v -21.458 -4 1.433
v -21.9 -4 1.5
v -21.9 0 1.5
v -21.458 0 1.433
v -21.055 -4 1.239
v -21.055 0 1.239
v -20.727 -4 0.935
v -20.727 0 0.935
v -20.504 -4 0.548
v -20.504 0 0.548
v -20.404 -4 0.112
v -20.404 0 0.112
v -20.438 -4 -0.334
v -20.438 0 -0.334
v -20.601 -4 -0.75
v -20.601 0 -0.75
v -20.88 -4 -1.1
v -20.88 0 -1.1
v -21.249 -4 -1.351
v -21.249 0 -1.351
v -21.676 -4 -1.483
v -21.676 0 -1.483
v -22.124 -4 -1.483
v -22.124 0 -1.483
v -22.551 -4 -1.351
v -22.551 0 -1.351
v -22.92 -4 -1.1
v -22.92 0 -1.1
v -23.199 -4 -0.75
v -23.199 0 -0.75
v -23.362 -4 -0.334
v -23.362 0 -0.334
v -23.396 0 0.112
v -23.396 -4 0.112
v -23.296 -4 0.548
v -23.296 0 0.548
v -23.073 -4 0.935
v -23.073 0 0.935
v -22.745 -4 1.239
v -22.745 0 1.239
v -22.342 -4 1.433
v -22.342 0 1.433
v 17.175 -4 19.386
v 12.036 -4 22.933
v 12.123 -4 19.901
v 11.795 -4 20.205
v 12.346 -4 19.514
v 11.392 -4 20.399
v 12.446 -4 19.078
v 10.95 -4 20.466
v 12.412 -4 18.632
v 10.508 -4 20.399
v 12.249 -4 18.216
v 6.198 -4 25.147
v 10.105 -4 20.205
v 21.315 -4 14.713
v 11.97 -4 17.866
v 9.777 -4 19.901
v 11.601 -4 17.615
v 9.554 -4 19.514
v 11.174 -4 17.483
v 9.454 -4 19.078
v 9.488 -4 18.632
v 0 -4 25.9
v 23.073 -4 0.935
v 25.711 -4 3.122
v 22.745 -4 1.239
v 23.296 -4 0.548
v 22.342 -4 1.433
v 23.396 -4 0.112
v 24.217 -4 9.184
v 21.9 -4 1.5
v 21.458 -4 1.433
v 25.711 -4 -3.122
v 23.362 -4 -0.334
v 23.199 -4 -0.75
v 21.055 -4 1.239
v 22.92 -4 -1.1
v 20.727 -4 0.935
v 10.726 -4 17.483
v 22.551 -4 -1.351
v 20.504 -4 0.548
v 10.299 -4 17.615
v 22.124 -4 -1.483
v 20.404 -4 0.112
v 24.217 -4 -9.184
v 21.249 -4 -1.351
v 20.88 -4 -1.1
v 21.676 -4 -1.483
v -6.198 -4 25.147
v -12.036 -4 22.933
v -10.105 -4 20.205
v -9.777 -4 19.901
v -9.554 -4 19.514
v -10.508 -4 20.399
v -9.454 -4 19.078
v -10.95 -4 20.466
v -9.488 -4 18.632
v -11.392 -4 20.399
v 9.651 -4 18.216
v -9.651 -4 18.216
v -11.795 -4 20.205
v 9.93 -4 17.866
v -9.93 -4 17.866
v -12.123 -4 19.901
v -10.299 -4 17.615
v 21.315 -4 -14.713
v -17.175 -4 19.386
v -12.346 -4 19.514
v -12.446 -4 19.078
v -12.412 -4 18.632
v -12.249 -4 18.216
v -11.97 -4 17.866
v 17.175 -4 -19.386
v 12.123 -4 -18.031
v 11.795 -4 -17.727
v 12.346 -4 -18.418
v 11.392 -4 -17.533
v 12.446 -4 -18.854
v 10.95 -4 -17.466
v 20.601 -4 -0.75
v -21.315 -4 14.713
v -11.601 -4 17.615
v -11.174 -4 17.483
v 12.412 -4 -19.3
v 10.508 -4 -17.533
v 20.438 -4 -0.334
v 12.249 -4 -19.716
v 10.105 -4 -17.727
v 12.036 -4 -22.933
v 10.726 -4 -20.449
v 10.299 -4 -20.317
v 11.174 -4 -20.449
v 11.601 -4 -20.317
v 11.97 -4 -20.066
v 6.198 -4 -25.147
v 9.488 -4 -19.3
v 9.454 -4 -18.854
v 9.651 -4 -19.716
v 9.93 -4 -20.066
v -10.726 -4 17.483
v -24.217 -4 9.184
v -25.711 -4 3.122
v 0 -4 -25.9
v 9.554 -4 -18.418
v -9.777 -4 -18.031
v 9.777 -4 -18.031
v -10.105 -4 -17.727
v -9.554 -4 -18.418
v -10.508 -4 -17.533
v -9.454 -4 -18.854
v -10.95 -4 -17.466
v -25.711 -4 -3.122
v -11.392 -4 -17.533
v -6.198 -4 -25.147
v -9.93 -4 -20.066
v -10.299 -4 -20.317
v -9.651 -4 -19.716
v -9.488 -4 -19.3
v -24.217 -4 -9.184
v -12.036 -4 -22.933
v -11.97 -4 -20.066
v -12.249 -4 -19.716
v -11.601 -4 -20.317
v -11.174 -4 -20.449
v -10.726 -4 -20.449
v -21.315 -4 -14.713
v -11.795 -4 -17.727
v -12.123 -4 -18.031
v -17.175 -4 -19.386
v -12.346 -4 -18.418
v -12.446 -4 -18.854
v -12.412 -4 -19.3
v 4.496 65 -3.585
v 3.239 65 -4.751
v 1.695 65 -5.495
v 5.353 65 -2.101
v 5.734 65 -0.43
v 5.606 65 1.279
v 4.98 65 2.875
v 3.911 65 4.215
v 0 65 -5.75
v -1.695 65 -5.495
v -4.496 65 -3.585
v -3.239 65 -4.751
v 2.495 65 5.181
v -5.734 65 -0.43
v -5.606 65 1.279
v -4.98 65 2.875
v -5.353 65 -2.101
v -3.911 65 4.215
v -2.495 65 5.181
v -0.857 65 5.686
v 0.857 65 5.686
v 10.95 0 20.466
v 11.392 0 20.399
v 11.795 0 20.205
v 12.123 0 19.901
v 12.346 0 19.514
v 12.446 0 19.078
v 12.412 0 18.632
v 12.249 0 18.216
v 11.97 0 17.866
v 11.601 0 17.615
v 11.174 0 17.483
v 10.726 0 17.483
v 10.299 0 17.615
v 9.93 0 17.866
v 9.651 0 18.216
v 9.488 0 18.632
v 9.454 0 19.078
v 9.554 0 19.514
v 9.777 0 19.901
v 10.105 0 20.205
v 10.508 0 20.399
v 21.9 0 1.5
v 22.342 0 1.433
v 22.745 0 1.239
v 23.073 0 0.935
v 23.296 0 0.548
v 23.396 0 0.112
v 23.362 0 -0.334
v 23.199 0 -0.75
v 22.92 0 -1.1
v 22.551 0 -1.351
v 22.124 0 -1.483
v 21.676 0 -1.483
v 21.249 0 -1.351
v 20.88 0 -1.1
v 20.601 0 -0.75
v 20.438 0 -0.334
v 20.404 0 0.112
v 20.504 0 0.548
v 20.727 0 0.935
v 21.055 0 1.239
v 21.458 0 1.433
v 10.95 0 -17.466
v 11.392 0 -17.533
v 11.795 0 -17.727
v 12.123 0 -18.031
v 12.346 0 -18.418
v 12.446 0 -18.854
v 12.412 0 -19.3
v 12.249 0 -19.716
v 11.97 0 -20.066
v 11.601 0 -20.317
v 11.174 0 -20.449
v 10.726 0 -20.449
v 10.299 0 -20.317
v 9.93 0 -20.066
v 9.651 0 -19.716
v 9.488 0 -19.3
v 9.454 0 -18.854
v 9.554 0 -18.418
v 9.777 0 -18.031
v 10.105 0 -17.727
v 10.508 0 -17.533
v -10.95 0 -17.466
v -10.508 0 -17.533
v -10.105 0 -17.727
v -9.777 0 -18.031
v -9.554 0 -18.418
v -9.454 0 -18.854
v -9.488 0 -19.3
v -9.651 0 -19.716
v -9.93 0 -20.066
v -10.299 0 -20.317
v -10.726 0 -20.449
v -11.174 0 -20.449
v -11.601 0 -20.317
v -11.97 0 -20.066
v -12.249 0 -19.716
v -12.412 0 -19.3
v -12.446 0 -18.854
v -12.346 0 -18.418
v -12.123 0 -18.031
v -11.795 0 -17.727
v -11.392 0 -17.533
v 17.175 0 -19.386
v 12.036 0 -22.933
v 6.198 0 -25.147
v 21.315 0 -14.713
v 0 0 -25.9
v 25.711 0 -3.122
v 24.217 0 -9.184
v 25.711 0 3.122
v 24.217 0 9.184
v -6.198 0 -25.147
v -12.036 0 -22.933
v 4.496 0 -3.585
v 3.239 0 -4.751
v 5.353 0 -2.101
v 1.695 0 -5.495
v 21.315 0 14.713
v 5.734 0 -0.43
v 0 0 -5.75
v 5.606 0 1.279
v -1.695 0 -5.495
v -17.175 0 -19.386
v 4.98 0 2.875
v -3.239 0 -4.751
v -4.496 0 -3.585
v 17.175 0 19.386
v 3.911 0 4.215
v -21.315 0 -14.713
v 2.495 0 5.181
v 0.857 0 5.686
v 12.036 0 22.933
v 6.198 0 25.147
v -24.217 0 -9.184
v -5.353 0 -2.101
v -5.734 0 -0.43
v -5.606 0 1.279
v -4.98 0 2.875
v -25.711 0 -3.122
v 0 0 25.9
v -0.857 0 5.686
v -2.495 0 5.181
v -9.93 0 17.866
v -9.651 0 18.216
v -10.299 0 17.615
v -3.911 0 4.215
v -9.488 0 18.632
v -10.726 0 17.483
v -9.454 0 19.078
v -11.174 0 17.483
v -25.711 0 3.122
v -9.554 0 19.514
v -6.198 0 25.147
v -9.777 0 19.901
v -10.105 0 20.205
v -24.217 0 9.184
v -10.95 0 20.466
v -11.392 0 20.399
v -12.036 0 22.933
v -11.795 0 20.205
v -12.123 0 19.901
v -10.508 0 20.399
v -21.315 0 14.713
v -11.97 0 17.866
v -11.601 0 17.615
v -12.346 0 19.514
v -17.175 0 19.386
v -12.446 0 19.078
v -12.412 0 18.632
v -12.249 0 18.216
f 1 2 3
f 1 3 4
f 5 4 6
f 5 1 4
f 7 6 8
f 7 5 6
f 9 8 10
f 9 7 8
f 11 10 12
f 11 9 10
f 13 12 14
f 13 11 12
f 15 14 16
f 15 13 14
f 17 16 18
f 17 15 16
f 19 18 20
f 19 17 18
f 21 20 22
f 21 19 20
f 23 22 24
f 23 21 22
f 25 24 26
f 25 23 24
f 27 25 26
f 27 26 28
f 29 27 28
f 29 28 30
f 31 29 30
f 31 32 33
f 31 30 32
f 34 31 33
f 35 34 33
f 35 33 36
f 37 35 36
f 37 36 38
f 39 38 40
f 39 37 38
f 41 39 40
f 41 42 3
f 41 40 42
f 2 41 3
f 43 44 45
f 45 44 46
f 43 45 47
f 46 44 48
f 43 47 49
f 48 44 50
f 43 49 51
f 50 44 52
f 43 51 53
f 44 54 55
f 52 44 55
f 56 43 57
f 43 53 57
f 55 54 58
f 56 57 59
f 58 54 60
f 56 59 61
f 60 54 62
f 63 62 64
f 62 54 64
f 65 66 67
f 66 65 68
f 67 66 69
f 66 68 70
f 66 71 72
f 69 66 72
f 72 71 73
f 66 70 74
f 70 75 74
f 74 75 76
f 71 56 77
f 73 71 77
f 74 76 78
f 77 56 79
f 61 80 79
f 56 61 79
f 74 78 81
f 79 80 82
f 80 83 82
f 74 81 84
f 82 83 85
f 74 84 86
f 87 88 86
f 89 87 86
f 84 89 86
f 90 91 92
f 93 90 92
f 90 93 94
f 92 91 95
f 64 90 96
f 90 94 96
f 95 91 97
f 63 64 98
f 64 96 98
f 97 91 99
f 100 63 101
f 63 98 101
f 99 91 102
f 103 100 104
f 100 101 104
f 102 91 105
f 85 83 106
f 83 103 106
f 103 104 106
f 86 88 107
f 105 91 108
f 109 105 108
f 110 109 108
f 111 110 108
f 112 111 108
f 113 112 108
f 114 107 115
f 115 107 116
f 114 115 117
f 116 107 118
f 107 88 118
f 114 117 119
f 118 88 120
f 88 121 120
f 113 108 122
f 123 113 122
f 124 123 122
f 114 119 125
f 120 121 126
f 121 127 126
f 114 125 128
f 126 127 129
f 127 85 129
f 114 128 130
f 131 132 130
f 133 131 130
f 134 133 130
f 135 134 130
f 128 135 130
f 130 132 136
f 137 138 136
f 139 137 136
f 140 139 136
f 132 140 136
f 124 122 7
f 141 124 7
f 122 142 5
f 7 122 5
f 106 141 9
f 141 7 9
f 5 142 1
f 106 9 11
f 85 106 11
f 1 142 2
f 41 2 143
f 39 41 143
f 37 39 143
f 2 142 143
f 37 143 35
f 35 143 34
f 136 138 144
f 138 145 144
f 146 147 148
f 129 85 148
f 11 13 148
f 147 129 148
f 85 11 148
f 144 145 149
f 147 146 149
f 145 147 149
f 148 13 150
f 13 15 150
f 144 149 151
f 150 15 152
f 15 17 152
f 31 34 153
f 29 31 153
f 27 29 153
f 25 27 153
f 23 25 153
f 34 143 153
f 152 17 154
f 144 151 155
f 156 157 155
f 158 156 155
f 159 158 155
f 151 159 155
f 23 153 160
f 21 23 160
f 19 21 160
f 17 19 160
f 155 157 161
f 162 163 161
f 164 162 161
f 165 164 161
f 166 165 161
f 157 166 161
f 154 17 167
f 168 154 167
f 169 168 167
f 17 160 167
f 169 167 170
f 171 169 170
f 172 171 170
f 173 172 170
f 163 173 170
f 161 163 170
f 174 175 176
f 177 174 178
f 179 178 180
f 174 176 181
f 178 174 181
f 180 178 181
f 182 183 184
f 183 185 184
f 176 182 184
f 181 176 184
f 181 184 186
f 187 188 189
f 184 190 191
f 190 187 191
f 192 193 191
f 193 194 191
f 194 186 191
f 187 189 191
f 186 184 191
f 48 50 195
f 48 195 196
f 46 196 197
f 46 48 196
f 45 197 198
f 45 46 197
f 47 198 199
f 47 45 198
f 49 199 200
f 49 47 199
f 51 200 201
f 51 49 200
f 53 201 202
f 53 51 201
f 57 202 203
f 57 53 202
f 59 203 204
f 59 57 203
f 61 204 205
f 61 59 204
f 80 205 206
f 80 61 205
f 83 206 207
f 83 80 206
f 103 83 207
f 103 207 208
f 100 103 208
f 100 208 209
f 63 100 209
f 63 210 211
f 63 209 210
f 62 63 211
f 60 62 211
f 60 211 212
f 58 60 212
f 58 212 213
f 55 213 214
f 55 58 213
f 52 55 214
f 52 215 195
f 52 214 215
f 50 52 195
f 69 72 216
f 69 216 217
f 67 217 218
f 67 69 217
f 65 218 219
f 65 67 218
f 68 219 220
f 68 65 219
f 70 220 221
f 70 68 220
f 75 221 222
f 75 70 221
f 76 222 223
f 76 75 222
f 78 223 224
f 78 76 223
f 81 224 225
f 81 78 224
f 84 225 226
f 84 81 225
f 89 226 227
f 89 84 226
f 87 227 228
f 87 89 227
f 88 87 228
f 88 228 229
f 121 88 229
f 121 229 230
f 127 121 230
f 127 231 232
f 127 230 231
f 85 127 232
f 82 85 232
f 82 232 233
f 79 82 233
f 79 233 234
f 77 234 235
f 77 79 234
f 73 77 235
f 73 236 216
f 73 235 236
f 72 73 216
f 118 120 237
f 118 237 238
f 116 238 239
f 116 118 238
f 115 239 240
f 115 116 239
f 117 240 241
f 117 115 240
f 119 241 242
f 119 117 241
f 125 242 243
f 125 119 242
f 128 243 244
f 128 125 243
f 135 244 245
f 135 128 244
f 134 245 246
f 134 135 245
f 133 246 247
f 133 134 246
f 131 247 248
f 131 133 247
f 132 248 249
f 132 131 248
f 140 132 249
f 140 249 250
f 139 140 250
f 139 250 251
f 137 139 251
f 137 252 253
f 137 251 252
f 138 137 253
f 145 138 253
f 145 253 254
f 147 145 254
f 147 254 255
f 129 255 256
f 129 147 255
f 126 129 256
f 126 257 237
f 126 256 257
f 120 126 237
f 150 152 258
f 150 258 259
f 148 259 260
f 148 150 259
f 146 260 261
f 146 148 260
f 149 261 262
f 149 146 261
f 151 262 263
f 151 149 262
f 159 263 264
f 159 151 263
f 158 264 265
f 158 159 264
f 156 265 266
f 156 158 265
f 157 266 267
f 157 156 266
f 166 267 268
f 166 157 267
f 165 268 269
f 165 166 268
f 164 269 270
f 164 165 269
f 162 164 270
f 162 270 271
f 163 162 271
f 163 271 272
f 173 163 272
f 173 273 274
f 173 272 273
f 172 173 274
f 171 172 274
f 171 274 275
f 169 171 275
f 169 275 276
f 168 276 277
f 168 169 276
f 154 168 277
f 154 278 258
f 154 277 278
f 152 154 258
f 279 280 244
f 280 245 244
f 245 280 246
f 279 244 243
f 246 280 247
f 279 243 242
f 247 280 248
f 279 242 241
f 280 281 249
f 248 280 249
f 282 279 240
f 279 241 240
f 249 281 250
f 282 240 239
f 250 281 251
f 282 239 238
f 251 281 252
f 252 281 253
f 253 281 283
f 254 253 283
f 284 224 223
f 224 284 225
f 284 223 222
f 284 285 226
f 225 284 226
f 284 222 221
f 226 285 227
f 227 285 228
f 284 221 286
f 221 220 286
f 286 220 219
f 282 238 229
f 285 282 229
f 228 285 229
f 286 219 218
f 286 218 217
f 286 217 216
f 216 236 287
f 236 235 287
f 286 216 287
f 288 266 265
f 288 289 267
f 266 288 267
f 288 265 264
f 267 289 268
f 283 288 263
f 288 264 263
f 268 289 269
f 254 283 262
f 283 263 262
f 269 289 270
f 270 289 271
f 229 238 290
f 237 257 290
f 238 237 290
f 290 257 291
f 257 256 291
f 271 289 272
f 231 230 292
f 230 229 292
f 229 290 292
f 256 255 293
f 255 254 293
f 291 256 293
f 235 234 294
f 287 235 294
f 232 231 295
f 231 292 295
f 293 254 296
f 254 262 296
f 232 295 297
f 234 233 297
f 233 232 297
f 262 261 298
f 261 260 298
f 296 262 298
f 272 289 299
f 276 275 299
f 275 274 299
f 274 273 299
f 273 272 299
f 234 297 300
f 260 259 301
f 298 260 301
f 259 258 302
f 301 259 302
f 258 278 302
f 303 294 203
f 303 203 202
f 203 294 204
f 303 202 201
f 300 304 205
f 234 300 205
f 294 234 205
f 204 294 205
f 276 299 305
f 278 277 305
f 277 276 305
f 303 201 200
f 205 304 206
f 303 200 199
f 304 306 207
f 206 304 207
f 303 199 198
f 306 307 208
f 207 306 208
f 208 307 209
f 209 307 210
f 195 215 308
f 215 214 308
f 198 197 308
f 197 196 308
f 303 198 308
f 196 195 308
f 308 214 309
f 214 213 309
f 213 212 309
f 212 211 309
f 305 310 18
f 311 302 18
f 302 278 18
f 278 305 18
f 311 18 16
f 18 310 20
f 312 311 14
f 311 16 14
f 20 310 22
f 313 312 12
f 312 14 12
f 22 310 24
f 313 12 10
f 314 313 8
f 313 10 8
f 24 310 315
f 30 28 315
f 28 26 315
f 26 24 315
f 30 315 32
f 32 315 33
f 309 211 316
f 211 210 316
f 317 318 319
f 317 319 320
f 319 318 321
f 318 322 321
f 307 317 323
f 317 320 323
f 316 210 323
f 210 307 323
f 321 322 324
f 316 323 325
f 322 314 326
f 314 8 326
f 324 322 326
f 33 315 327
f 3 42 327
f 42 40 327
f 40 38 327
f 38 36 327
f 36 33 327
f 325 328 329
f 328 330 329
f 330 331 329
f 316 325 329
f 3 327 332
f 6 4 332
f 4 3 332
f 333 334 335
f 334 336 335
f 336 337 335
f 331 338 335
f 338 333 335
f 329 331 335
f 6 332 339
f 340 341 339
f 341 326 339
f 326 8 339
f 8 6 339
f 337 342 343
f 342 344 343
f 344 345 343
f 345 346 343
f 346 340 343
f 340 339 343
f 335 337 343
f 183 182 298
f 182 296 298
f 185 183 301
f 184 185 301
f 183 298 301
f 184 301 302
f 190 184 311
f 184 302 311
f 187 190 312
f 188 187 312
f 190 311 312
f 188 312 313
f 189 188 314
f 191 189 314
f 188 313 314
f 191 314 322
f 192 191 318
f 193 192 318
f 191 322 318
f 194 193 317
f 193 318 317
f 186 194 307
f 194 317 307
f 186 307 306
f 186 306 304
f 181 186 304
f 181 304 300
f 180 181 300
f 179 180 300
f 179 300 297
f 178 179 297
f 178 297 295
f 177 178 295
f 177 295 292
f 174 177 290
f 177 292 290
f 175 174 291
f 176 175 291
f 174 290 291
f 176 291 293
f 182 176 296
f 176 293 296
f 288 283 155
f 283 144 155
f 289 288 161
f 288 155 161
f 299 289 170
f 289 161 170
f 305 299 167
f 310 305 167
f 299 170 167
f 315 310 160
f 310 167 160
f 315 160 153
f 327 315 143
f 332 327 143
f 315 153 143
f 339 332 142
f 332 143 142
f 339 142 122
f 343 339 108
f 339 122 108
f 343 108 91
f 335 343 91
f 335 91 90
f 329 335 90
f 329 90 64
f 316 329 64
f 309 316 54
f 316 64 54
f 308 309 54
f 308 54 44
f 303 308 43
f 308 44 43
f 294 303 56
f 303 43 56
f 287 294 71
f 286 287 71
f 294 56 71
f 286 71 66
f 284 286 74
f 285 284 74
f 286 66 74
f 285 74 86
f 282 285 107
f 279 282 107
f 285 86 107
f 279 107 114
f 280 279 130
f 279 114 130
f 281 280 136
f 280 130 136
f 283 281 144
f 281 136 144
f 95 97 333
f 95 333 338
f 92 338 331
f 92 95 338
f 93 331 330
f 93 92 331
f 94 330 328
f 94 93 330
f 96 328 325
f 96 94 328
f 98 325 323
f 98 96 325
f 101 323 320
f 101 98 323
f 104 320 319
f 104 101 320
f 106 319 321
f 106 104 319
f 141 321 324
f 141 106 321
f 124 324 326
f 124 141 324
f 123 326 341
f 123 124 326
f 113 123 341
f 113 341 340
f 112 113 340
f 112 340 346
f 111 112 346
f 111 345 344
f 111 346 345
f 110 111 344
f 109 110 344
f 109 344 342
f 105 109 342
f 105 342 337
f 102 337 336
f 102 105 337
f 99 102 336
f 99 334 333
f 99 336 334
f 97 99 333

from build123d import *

# Parameters (mm, degrees)
CUT_EXTRUDE_1_DEPTH      = 75.609784881
CUT_EXTRUDE_1_DEPTH_BACK = 75.609784881
SKETCH_2_R               = 1.5


with BuildPart() as part:
    # Эскиз1 → Повернуть1 (revolve)
    with BuildSketch(Plane.XY, mode=Mode.PRIVATE) as revolve_1_sk:
        Polygon((5.75, 0), (25.9, 0), (25.9, -4), (0, -4), (0, 65), (5.75, 65), align=None)
    revolve(revolve_1_sk.sketch.rotate(Axis((0, 0, 0), (0, 1, 0)), 90), axis=Axis((0, 0, 0), (0, 1, 0)))

    # Эскиз2 → Вырез-Вытянуть1 (cut, two sides: drawn at the far end of the back side and taken through both)
    with BuildSketch(Plane(origin=(0, 0, 0), x_dir=(1, 0, 0), z_dir=(0, 1, 0)).offset(-CUT_EXTRUDE_1_DEPTH_BACK)):
        with Locations(Location((21.9, 0, 0), (0, 0, 270))):
            Circle(SKETCH_2_R)
        with Locations(Location((10.95, -18.965956343, 0), (0, 0, 270))):
            Circle(SKETCH_2_R)
        with Locations(Location((-10.95, -18.965956343, 0), (0, 0, 270))):
            Circle(SKETCH_2_R)
        with Locations(Location((-21.9, 0, 0), (0, 0, 270))):
            Circle(SKETCH_2_R)
        with Locations(Location((-10.95, 18.965956343, 0), (0, 0, 270))):
            Circle(SKETCH_2_R)
        with Locations(Location((10.95, 18.965956343, 0), (0, 0, 270))):
            Circle(SKETCH_2_R)
    extrude(amount=CUT_EXTRUDE_1_DEPTH + CUT_EXTRUDE_1_DEPTH_BACK, mode=Mode.SUBTRACT)


solid = part.part
